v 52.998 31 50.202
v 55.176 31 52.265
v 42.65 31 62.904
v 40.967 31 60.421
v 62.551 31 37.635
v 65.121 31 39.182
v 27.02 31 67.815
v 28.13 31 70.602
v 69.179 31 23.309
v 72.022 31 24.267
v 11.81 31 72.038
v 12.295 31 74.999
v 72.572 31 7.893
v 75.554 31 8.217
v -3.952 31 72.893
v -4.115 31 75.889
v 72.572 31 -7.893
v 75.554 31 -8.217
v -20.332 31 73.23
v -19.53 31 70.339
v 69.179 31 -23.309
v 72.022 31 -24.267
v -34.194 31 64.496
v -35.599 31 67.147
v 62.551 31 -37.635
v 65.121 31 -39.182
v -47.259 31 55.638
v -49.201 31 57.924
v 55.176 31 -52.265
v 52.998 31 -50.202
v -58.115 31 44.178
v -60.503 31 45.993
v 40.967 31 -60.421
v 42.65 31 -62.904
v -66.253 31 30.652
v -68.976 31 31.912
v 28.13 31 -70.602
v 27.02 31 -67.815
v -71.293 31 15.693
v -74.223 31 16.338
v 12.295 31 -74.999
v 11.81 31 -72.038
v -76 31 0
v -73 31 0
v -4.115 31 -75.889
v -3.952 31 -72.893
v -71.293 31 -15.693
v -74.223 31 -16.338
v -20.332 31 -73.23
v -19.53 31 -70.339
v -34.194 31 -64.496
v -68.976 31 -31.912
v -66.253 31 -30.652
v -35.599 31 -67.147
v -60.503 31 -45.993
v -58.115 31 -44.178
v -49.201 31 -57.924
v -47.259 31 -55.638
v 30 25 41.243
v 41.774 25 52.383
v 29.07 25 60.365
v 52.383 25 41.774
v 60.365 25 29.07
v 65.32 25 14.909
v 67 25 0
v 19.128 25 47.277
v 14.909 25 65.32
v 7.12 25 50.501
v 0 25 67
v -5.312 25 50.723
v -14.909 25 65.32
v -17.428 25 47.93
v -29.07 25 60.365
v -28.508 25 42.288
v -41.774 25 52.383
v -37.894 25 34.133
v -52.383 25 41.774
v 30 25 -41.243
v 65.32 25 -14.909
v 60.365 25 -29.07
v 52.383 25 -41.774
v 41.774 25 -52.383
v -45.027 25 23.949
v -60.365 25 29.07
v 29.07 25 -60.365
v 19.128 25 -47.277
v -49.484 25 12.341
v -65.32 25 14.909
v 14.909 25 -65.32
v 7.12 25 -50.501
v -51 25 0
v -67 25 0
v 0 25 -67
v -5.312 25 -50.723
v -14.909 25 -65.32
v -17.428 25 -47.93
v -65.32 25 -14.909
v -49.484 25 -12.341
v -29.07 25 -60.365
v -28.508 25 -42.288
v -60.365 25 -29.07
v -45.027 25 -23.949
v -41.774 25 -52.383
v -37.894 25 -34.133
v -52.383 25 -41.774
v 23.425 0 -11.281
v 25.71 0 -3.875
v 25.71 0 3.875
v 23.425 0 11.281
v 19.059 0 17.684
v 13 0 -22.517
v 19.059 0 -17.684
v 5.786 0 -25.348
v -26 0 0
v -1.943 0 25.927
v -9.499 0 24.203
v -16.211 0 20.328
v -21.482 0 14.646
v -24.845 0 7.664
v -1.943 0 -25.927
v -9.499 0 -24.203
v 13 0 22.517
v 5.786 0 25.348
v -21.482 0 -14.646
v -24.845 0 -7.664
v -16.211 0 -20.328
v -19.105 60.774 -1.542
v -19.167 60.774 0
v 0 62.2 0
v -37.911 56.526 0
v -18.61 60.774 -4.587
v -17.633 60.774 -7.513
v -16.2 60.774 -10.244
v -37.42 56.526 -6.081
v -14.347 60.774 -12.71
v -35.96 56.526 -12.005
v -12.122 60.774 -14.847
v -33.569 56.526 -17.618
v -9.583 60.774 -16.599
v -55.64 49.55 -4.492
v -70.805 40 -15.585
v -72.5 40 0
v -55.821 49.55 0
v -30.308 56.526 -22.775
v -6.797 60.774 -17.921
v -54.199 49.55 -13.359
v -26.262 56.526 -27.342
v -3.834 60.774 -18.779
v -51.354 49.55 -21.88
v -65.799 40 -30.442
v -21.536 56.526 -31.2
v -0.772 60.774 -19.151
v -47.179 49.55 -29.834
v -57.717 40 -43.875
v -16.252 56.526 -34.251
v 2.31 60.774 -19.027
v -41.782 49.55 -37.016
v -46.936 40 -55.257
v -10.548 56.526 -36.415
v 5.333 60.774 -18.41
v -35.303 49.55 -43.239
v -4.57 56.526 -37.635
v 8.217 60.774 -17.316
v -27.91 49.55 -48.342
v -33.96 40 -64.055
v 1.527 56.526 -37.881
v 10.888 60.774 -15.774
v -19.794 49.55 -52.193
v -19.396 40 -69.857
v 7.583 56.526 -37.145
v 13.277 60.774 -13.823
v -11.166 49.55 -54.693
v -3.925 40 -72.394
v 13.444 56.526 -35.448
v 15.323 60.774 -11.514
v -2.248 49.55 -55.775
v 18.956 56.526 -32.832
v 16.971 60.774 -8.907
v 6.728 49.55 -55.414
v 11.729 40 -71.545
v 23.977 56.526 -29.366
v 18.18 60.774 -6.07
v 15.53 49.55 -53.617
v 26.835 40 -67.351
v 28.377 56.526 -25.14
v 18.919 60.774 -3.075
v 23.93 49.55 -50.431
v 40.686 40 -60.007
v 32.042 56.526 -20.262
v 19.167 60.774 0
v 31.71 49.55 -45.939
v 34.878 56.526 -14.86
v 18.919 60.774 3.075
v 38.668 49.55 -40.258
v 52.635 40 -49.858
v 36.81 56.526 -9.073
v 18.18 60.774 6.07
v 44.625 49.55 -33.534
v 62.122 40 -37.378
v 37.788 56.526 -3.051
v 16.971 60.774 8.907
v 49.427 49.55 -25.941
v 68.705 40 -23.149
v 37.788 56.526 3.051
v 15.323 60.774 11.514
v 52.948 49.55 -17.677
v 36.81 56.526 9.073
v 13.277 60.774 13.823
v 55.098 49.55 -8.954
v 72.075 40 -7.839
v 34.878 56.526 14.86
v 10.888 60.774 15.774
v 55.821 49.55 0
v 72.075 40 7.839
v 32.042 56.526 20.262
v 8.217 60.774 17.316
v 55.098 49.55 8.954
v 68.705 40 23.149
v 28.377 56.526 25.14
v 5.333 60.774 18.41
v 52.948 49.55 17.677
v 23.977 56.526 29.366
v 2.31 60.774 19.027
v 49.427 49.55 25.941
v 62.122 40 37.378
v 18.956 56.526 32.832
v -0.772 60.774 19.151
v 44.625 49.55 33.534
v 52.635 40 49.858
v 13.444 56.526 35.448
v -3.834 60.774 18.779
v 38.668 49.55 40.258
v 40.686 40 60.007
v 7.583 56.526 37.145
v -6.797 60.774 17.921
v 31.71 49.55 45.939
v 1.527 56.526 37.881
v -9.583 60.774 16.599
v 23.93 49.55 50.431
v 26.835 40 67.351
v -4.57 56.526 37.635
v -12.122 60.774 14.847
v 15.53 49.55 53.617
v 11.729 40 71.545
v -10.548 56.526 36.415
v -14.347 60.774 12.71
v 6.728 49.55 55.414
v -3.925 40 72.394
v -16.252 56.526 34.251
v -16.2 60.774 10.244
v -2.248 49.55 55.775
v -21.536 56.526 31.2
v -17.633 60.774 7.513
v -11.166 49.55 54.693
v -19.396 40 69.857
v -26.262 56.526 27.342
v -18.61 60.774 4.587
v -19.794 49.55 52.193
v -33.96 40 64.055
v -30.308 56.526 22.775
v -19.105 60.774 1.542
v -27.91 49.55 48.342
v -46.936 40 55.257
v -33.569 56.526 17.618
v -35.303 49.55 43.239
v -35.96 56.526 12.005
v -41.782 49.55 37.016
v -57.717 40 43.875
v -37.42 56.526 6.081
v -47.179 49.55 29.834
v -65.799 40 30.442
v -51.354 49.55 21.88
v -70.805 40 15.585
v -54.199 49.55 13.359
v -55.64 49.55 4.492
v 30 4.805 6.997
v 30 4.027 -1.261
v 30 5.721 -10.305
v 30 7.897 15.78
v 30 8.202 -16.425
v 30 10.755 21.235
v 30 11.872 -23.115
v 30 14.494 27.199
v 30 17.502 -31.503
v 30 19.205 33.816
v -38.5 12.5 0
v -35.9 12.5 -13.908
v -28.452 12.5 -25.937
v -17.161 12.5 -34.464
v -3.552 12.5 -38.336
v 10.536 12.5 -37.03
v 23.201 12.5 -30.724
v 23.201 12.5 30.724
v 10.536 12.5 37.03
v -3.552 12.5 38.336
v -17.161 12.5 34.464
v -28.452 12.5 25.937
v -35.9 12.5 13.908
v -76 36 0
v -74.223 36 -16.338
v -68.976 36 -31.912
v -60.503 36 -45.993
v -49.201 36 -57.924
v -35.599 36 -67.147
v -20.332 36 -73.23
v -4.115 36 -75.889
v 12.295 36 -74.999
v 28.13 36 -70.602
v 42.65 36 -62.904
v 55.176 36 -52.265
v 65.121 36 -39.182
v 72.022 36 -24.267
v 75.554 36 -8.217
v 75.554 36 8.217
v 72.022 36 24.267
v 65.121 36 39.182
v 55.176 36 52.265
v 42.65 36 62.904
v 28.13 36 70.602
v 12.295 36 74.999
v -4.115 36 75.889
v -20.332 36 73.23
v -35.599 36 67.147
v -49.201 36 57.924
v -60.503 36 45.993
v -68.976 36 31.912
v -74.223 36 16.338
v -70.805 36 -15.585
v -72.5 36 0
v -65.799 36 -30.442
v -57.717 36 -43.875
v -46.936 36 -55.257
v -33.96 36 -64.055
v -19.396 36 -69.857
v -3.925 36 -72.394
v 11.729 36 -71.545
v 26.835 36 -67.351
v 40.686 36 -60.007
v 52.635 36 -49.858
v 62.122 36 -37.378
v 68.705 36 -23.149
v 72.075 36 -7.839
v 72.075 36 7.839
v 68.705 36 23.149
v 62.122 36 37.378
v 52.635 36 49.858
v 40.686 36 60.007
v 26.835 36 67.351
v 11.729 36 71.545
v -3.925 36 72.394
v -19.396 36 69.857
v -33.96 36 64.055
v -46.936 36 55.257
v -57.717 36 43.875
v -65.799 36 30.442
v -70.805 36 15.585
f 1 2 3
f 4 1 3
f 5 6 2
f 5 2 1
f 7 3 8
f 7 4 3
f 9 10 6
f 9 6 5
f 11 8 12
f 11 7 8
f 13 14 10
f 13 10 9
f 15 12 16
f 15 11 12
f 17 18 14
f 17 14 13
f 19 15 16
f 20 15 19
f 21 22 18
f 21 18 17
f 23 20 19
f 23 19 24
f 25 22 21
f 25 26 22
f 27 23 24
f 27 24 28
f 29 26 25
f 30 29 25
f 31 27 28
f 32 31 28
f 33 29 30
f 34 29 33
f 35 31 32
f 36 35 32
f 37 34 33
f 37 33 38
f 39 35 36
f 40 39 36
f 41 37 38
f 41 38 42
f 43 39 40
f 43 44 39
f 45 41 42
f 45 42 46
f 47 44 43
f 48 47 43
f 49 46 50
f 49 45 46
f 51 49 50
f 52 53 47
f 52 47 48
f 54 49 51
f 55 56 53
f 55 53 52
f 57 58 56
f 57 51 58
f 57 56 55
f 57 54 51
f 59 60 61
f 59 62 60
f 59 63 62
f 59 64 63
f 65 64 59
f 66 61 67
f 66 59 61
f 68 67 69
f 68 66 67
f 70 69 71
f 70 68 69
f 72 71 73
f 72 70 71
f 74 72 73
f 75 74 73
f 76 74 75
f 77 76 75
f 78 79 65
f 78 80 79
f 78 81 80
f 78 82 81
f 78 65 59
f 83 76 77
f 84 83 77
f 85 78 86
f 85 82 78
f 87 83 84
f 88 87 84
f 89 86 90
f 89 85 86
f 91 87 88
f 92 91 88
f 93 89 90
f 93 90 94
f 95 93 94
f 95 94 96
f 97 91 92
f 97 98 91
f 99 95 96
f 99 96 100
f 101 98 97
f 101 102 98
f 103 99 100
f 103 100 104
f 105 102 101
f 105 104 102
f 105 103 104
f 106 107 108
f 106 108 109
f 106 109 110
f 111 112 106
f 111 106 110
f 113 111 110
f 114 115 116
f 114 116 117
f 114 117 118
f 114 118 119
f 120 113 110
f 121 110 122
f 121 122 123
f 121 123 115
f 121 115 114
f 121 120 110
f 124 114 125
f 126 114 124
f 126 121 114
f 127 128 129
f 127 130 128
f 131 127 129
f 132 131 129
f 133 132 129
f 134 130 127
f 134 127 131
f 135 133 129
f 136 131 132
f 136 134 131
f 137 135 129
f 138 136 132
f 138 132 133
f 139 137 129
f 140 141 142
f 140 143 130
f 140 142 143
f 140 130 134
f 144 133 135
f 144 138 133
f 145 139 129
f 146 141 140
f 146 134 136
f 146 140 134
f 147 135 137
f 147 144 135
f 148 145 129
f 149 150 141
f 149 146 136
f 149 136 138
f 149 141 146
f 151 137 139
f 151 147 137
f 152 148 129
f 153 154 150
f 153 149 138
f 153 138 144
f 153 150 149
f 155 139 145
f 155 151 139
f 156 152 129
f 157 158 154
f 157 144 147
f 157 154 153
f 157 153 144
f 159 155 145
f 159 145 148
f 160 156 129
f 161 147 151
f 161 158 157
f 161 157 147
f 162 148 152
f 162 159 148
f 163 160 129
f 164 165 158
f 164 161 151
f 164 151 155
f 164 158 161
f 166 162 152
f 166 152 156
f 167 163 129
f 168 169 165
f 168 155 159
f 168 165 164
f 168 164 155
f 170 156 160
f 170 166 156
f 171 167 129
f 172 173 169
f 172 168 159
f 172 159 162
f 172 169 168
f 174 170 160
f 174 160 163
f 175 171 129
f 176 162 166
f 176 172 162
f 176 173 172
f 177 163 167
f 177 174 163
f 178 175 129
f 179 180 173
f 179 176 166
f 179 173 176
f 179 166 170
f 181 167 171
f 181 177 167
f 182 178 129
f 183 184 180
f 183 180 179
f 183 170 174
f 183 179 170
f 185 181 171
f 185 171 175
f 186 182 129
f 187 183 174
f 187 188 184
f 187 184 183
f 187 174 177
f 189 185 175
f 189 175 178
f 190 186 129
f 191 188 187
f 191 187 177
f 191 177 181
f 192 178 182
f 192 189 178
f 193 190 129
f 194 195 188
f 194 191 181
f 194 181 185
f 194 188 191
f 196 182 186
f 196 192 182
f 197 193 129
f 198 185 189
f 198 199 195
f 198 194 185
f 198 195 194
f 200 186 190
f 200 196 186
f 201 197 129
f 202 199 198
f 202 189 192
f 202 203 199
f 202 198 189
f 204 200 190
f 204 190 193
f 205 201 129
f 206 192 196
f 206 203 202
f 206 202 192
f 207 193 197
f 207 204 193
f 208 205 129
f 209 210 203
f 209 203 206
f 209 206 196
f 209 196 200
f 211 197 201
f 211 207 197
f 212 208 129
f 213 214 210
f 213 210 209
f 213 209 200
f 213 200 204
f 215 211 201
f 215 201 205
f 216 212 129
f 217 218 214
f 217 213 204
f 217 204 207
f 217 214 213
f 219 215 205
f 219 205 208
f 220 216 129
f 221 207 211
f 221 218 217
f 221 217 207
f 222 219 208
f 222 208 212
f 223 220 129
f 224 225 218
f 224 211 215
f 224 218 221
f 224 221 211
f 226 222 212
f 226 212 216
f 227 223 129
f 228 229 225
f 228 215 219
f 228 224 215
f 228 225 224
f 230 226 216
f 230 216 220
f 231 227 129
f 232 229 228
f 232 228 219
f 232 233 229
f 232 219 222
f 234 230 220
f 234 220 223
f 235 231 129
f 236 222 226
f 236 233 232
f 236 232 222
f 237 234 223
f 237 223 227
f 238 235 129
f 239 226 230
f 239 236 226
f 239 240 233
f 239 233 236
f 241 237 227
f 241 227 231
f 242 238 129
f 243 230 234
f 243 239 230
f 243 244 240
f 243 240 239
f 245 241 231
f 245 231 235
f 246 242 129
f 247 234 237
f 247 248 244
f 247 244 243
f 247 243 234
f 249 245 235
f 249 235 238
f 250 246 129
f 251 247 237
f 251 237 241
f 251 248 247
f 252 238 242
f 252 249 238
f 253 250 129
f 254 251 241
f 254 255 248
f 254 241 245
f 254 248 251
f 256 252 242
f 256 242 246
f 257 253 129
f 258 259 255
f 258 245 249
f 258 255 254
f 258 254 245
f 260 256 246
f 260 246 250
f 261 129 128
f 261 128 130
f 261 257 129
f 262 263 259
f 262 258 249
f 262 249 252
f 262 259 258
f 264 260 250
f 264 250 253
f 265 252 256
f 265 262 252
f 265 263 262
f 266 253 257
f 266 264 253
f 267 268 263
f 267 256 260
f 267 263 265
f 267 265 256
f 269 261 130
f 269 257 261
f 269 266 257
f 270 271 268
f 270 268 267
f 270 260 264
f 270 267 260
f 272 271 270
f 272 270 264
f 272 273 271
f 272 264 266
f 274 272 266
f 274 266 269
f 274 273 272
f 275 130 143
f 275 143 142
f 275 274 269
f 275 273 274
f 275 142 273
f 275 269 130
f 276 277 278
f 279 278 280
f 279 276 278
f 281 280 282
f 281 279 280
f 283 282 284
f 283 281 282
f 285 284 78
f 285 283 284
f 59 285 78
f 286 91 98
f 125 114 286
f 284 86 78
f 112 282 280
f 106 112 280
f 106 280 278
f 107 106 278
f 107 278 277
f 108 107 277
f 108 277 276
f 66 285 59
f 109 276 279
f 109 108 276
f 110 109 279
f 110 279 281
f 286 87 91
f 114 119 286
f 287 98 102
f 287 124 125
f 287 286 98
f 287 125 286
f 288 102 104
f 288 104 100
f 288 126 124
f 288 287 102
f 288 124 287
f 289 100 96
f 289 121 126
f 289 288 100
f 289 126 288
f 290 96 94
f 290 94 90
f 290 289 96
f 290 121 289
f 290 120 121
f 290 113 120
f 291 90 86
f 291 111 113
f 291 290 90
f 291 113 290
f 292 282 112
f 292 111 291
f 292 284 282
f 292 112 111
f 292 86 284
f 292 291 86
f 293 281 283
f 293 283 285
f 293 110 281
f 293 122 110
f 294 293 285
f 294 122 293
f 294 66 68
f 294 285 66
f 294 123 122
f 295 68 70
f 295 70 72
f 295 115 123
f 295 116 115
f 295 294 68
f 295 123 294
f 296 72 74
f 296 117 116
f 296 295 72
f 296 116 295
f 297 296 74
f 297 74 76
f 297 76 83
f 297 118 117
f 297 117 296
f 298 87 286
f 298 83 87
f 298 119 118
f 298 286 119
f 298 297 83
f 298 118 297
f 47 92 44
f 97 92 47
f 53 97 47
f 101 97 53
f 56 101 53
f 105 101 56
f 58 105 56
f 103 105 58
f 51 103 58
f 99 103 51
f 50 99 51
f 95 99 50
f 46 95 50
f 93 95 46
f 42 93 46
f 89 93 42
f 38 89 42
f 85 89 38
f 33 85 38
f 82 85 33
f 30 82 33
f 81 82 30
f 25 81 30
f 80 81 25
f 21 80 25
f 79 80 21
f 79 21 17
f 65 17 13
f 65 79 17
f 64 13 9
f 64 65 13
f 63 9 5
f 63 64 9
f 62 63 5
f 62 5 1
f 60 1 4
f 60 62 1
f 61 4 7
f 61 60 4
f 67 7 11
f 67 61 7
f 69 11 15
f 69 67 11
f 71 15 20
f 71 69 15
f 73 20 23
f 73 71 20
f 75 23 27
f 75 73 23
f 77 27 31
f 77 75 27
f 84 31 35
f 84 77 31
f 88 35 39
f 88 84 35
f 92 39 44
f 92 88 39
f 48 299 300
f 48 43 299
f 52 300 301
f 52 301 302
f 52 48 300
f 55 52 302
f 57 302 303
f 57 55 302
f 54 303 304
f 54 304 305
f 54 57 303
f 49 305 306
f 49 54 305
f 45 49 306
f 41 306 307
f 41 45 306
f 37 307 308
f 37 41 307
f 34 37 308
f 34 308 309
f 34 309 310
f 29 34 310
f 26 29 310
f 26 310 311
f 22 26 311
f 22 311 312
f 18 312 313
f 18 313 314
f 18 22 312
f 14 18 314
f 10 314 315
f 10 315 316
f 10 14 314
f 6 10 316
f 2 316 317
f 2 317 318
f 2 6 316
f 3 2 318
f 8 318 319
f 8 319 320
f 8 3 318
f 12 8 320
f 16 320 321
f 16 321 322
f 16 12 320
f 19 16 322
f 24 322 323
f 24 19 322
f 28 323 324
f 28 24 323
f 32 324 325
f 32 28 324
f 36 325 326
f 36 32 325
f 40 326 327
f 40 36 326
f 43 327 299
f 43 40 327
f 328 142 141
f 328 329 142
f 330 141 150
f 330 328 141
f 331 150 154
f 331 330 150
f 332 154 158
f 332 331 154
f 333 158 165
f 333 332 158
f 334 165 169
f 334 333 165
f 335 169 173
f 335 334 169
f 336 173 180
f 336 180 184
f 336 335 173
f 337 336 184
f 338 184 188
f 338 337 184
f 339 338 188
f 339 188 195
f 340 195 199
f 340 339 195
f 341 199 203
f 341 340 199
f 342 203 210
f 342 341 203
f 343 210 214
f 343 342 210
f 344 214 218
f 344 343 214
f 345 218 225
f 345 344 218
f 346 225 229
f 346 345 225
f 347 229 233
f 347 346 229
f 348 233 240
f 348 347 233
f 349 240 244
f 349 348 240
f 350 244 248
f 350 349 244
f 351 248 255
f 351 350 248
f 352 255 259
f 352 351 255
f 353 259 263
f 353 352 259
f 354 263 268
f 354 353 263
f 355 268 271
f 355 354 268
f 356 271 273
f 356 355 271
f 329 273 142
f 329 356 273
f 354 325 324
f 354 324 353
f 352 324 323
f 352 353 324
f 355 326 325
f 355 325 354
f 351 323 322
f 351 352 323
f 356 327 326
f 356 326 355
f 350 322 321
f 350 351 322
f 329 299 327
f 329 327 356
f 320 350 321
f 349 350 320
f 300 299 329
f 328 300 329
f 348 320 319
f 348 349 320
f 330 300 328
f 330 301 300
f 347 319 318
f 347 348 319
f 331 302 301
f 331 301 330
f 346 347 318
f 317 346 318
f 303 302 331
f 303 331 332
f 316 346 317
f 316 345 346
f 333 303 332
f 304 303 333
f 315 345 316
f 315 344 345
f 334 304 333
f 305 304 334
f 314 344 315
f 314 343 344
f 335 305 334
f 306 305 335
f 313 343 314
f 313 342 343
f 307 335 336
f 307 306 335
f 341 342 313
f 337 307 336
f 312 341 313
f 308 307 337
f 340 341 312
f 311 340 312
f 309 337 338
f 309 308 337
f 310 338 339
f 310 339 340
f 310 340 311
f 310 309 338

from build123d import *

# Parameters (mm, degrees)
SKETCH2_W          = 70
SKETCH2_H          = 180
CUT_EXTRUDE1_DEPTH = 25


with BuildPart() as part:
    # Sketch1 → Revolve1 (revolve)
    with BuildSketch(Plane.XY, mode=Mode.PRIVATE) as revolve1_sk:
        with BuildLine():
            Line((72.5, 40), (72.5, 36))
            Line((72.5, 36), (76, 36))
            Line((76, 36), (76, 31))
            Line((76, 31), (73, 31))
            Line((73, 31), (67, 25))
            Line((67, 25), (51, 25))
            Line((51, 25), (26, 0))
            Line((26, 0), (0, 0))
            Line((0, 0), (0, 62.2))
            ThreePointArc((0, 62.2), (37.91137692, 56.525667871), (72.5, 40))
        make_face()
    revolve(revolve1_sk.sketch.rotate(Axis((0, 0, 0), (0, -1, 0)), 180), axis=Axis((0, 0, 0), (0, -1, 0)))

    # Sketch2 → Cut-Extrude1 (cut)
    with BuildSketch(Plane.XZ):
        with Locations((65, 0)):
            Rectangle(SKETCH2_W, SKETCH2_H)
    extrude(amount=-CUT_EXTRUDE1_DEPTH, mode=Mode.SUBTRACT)


solid = part.part
